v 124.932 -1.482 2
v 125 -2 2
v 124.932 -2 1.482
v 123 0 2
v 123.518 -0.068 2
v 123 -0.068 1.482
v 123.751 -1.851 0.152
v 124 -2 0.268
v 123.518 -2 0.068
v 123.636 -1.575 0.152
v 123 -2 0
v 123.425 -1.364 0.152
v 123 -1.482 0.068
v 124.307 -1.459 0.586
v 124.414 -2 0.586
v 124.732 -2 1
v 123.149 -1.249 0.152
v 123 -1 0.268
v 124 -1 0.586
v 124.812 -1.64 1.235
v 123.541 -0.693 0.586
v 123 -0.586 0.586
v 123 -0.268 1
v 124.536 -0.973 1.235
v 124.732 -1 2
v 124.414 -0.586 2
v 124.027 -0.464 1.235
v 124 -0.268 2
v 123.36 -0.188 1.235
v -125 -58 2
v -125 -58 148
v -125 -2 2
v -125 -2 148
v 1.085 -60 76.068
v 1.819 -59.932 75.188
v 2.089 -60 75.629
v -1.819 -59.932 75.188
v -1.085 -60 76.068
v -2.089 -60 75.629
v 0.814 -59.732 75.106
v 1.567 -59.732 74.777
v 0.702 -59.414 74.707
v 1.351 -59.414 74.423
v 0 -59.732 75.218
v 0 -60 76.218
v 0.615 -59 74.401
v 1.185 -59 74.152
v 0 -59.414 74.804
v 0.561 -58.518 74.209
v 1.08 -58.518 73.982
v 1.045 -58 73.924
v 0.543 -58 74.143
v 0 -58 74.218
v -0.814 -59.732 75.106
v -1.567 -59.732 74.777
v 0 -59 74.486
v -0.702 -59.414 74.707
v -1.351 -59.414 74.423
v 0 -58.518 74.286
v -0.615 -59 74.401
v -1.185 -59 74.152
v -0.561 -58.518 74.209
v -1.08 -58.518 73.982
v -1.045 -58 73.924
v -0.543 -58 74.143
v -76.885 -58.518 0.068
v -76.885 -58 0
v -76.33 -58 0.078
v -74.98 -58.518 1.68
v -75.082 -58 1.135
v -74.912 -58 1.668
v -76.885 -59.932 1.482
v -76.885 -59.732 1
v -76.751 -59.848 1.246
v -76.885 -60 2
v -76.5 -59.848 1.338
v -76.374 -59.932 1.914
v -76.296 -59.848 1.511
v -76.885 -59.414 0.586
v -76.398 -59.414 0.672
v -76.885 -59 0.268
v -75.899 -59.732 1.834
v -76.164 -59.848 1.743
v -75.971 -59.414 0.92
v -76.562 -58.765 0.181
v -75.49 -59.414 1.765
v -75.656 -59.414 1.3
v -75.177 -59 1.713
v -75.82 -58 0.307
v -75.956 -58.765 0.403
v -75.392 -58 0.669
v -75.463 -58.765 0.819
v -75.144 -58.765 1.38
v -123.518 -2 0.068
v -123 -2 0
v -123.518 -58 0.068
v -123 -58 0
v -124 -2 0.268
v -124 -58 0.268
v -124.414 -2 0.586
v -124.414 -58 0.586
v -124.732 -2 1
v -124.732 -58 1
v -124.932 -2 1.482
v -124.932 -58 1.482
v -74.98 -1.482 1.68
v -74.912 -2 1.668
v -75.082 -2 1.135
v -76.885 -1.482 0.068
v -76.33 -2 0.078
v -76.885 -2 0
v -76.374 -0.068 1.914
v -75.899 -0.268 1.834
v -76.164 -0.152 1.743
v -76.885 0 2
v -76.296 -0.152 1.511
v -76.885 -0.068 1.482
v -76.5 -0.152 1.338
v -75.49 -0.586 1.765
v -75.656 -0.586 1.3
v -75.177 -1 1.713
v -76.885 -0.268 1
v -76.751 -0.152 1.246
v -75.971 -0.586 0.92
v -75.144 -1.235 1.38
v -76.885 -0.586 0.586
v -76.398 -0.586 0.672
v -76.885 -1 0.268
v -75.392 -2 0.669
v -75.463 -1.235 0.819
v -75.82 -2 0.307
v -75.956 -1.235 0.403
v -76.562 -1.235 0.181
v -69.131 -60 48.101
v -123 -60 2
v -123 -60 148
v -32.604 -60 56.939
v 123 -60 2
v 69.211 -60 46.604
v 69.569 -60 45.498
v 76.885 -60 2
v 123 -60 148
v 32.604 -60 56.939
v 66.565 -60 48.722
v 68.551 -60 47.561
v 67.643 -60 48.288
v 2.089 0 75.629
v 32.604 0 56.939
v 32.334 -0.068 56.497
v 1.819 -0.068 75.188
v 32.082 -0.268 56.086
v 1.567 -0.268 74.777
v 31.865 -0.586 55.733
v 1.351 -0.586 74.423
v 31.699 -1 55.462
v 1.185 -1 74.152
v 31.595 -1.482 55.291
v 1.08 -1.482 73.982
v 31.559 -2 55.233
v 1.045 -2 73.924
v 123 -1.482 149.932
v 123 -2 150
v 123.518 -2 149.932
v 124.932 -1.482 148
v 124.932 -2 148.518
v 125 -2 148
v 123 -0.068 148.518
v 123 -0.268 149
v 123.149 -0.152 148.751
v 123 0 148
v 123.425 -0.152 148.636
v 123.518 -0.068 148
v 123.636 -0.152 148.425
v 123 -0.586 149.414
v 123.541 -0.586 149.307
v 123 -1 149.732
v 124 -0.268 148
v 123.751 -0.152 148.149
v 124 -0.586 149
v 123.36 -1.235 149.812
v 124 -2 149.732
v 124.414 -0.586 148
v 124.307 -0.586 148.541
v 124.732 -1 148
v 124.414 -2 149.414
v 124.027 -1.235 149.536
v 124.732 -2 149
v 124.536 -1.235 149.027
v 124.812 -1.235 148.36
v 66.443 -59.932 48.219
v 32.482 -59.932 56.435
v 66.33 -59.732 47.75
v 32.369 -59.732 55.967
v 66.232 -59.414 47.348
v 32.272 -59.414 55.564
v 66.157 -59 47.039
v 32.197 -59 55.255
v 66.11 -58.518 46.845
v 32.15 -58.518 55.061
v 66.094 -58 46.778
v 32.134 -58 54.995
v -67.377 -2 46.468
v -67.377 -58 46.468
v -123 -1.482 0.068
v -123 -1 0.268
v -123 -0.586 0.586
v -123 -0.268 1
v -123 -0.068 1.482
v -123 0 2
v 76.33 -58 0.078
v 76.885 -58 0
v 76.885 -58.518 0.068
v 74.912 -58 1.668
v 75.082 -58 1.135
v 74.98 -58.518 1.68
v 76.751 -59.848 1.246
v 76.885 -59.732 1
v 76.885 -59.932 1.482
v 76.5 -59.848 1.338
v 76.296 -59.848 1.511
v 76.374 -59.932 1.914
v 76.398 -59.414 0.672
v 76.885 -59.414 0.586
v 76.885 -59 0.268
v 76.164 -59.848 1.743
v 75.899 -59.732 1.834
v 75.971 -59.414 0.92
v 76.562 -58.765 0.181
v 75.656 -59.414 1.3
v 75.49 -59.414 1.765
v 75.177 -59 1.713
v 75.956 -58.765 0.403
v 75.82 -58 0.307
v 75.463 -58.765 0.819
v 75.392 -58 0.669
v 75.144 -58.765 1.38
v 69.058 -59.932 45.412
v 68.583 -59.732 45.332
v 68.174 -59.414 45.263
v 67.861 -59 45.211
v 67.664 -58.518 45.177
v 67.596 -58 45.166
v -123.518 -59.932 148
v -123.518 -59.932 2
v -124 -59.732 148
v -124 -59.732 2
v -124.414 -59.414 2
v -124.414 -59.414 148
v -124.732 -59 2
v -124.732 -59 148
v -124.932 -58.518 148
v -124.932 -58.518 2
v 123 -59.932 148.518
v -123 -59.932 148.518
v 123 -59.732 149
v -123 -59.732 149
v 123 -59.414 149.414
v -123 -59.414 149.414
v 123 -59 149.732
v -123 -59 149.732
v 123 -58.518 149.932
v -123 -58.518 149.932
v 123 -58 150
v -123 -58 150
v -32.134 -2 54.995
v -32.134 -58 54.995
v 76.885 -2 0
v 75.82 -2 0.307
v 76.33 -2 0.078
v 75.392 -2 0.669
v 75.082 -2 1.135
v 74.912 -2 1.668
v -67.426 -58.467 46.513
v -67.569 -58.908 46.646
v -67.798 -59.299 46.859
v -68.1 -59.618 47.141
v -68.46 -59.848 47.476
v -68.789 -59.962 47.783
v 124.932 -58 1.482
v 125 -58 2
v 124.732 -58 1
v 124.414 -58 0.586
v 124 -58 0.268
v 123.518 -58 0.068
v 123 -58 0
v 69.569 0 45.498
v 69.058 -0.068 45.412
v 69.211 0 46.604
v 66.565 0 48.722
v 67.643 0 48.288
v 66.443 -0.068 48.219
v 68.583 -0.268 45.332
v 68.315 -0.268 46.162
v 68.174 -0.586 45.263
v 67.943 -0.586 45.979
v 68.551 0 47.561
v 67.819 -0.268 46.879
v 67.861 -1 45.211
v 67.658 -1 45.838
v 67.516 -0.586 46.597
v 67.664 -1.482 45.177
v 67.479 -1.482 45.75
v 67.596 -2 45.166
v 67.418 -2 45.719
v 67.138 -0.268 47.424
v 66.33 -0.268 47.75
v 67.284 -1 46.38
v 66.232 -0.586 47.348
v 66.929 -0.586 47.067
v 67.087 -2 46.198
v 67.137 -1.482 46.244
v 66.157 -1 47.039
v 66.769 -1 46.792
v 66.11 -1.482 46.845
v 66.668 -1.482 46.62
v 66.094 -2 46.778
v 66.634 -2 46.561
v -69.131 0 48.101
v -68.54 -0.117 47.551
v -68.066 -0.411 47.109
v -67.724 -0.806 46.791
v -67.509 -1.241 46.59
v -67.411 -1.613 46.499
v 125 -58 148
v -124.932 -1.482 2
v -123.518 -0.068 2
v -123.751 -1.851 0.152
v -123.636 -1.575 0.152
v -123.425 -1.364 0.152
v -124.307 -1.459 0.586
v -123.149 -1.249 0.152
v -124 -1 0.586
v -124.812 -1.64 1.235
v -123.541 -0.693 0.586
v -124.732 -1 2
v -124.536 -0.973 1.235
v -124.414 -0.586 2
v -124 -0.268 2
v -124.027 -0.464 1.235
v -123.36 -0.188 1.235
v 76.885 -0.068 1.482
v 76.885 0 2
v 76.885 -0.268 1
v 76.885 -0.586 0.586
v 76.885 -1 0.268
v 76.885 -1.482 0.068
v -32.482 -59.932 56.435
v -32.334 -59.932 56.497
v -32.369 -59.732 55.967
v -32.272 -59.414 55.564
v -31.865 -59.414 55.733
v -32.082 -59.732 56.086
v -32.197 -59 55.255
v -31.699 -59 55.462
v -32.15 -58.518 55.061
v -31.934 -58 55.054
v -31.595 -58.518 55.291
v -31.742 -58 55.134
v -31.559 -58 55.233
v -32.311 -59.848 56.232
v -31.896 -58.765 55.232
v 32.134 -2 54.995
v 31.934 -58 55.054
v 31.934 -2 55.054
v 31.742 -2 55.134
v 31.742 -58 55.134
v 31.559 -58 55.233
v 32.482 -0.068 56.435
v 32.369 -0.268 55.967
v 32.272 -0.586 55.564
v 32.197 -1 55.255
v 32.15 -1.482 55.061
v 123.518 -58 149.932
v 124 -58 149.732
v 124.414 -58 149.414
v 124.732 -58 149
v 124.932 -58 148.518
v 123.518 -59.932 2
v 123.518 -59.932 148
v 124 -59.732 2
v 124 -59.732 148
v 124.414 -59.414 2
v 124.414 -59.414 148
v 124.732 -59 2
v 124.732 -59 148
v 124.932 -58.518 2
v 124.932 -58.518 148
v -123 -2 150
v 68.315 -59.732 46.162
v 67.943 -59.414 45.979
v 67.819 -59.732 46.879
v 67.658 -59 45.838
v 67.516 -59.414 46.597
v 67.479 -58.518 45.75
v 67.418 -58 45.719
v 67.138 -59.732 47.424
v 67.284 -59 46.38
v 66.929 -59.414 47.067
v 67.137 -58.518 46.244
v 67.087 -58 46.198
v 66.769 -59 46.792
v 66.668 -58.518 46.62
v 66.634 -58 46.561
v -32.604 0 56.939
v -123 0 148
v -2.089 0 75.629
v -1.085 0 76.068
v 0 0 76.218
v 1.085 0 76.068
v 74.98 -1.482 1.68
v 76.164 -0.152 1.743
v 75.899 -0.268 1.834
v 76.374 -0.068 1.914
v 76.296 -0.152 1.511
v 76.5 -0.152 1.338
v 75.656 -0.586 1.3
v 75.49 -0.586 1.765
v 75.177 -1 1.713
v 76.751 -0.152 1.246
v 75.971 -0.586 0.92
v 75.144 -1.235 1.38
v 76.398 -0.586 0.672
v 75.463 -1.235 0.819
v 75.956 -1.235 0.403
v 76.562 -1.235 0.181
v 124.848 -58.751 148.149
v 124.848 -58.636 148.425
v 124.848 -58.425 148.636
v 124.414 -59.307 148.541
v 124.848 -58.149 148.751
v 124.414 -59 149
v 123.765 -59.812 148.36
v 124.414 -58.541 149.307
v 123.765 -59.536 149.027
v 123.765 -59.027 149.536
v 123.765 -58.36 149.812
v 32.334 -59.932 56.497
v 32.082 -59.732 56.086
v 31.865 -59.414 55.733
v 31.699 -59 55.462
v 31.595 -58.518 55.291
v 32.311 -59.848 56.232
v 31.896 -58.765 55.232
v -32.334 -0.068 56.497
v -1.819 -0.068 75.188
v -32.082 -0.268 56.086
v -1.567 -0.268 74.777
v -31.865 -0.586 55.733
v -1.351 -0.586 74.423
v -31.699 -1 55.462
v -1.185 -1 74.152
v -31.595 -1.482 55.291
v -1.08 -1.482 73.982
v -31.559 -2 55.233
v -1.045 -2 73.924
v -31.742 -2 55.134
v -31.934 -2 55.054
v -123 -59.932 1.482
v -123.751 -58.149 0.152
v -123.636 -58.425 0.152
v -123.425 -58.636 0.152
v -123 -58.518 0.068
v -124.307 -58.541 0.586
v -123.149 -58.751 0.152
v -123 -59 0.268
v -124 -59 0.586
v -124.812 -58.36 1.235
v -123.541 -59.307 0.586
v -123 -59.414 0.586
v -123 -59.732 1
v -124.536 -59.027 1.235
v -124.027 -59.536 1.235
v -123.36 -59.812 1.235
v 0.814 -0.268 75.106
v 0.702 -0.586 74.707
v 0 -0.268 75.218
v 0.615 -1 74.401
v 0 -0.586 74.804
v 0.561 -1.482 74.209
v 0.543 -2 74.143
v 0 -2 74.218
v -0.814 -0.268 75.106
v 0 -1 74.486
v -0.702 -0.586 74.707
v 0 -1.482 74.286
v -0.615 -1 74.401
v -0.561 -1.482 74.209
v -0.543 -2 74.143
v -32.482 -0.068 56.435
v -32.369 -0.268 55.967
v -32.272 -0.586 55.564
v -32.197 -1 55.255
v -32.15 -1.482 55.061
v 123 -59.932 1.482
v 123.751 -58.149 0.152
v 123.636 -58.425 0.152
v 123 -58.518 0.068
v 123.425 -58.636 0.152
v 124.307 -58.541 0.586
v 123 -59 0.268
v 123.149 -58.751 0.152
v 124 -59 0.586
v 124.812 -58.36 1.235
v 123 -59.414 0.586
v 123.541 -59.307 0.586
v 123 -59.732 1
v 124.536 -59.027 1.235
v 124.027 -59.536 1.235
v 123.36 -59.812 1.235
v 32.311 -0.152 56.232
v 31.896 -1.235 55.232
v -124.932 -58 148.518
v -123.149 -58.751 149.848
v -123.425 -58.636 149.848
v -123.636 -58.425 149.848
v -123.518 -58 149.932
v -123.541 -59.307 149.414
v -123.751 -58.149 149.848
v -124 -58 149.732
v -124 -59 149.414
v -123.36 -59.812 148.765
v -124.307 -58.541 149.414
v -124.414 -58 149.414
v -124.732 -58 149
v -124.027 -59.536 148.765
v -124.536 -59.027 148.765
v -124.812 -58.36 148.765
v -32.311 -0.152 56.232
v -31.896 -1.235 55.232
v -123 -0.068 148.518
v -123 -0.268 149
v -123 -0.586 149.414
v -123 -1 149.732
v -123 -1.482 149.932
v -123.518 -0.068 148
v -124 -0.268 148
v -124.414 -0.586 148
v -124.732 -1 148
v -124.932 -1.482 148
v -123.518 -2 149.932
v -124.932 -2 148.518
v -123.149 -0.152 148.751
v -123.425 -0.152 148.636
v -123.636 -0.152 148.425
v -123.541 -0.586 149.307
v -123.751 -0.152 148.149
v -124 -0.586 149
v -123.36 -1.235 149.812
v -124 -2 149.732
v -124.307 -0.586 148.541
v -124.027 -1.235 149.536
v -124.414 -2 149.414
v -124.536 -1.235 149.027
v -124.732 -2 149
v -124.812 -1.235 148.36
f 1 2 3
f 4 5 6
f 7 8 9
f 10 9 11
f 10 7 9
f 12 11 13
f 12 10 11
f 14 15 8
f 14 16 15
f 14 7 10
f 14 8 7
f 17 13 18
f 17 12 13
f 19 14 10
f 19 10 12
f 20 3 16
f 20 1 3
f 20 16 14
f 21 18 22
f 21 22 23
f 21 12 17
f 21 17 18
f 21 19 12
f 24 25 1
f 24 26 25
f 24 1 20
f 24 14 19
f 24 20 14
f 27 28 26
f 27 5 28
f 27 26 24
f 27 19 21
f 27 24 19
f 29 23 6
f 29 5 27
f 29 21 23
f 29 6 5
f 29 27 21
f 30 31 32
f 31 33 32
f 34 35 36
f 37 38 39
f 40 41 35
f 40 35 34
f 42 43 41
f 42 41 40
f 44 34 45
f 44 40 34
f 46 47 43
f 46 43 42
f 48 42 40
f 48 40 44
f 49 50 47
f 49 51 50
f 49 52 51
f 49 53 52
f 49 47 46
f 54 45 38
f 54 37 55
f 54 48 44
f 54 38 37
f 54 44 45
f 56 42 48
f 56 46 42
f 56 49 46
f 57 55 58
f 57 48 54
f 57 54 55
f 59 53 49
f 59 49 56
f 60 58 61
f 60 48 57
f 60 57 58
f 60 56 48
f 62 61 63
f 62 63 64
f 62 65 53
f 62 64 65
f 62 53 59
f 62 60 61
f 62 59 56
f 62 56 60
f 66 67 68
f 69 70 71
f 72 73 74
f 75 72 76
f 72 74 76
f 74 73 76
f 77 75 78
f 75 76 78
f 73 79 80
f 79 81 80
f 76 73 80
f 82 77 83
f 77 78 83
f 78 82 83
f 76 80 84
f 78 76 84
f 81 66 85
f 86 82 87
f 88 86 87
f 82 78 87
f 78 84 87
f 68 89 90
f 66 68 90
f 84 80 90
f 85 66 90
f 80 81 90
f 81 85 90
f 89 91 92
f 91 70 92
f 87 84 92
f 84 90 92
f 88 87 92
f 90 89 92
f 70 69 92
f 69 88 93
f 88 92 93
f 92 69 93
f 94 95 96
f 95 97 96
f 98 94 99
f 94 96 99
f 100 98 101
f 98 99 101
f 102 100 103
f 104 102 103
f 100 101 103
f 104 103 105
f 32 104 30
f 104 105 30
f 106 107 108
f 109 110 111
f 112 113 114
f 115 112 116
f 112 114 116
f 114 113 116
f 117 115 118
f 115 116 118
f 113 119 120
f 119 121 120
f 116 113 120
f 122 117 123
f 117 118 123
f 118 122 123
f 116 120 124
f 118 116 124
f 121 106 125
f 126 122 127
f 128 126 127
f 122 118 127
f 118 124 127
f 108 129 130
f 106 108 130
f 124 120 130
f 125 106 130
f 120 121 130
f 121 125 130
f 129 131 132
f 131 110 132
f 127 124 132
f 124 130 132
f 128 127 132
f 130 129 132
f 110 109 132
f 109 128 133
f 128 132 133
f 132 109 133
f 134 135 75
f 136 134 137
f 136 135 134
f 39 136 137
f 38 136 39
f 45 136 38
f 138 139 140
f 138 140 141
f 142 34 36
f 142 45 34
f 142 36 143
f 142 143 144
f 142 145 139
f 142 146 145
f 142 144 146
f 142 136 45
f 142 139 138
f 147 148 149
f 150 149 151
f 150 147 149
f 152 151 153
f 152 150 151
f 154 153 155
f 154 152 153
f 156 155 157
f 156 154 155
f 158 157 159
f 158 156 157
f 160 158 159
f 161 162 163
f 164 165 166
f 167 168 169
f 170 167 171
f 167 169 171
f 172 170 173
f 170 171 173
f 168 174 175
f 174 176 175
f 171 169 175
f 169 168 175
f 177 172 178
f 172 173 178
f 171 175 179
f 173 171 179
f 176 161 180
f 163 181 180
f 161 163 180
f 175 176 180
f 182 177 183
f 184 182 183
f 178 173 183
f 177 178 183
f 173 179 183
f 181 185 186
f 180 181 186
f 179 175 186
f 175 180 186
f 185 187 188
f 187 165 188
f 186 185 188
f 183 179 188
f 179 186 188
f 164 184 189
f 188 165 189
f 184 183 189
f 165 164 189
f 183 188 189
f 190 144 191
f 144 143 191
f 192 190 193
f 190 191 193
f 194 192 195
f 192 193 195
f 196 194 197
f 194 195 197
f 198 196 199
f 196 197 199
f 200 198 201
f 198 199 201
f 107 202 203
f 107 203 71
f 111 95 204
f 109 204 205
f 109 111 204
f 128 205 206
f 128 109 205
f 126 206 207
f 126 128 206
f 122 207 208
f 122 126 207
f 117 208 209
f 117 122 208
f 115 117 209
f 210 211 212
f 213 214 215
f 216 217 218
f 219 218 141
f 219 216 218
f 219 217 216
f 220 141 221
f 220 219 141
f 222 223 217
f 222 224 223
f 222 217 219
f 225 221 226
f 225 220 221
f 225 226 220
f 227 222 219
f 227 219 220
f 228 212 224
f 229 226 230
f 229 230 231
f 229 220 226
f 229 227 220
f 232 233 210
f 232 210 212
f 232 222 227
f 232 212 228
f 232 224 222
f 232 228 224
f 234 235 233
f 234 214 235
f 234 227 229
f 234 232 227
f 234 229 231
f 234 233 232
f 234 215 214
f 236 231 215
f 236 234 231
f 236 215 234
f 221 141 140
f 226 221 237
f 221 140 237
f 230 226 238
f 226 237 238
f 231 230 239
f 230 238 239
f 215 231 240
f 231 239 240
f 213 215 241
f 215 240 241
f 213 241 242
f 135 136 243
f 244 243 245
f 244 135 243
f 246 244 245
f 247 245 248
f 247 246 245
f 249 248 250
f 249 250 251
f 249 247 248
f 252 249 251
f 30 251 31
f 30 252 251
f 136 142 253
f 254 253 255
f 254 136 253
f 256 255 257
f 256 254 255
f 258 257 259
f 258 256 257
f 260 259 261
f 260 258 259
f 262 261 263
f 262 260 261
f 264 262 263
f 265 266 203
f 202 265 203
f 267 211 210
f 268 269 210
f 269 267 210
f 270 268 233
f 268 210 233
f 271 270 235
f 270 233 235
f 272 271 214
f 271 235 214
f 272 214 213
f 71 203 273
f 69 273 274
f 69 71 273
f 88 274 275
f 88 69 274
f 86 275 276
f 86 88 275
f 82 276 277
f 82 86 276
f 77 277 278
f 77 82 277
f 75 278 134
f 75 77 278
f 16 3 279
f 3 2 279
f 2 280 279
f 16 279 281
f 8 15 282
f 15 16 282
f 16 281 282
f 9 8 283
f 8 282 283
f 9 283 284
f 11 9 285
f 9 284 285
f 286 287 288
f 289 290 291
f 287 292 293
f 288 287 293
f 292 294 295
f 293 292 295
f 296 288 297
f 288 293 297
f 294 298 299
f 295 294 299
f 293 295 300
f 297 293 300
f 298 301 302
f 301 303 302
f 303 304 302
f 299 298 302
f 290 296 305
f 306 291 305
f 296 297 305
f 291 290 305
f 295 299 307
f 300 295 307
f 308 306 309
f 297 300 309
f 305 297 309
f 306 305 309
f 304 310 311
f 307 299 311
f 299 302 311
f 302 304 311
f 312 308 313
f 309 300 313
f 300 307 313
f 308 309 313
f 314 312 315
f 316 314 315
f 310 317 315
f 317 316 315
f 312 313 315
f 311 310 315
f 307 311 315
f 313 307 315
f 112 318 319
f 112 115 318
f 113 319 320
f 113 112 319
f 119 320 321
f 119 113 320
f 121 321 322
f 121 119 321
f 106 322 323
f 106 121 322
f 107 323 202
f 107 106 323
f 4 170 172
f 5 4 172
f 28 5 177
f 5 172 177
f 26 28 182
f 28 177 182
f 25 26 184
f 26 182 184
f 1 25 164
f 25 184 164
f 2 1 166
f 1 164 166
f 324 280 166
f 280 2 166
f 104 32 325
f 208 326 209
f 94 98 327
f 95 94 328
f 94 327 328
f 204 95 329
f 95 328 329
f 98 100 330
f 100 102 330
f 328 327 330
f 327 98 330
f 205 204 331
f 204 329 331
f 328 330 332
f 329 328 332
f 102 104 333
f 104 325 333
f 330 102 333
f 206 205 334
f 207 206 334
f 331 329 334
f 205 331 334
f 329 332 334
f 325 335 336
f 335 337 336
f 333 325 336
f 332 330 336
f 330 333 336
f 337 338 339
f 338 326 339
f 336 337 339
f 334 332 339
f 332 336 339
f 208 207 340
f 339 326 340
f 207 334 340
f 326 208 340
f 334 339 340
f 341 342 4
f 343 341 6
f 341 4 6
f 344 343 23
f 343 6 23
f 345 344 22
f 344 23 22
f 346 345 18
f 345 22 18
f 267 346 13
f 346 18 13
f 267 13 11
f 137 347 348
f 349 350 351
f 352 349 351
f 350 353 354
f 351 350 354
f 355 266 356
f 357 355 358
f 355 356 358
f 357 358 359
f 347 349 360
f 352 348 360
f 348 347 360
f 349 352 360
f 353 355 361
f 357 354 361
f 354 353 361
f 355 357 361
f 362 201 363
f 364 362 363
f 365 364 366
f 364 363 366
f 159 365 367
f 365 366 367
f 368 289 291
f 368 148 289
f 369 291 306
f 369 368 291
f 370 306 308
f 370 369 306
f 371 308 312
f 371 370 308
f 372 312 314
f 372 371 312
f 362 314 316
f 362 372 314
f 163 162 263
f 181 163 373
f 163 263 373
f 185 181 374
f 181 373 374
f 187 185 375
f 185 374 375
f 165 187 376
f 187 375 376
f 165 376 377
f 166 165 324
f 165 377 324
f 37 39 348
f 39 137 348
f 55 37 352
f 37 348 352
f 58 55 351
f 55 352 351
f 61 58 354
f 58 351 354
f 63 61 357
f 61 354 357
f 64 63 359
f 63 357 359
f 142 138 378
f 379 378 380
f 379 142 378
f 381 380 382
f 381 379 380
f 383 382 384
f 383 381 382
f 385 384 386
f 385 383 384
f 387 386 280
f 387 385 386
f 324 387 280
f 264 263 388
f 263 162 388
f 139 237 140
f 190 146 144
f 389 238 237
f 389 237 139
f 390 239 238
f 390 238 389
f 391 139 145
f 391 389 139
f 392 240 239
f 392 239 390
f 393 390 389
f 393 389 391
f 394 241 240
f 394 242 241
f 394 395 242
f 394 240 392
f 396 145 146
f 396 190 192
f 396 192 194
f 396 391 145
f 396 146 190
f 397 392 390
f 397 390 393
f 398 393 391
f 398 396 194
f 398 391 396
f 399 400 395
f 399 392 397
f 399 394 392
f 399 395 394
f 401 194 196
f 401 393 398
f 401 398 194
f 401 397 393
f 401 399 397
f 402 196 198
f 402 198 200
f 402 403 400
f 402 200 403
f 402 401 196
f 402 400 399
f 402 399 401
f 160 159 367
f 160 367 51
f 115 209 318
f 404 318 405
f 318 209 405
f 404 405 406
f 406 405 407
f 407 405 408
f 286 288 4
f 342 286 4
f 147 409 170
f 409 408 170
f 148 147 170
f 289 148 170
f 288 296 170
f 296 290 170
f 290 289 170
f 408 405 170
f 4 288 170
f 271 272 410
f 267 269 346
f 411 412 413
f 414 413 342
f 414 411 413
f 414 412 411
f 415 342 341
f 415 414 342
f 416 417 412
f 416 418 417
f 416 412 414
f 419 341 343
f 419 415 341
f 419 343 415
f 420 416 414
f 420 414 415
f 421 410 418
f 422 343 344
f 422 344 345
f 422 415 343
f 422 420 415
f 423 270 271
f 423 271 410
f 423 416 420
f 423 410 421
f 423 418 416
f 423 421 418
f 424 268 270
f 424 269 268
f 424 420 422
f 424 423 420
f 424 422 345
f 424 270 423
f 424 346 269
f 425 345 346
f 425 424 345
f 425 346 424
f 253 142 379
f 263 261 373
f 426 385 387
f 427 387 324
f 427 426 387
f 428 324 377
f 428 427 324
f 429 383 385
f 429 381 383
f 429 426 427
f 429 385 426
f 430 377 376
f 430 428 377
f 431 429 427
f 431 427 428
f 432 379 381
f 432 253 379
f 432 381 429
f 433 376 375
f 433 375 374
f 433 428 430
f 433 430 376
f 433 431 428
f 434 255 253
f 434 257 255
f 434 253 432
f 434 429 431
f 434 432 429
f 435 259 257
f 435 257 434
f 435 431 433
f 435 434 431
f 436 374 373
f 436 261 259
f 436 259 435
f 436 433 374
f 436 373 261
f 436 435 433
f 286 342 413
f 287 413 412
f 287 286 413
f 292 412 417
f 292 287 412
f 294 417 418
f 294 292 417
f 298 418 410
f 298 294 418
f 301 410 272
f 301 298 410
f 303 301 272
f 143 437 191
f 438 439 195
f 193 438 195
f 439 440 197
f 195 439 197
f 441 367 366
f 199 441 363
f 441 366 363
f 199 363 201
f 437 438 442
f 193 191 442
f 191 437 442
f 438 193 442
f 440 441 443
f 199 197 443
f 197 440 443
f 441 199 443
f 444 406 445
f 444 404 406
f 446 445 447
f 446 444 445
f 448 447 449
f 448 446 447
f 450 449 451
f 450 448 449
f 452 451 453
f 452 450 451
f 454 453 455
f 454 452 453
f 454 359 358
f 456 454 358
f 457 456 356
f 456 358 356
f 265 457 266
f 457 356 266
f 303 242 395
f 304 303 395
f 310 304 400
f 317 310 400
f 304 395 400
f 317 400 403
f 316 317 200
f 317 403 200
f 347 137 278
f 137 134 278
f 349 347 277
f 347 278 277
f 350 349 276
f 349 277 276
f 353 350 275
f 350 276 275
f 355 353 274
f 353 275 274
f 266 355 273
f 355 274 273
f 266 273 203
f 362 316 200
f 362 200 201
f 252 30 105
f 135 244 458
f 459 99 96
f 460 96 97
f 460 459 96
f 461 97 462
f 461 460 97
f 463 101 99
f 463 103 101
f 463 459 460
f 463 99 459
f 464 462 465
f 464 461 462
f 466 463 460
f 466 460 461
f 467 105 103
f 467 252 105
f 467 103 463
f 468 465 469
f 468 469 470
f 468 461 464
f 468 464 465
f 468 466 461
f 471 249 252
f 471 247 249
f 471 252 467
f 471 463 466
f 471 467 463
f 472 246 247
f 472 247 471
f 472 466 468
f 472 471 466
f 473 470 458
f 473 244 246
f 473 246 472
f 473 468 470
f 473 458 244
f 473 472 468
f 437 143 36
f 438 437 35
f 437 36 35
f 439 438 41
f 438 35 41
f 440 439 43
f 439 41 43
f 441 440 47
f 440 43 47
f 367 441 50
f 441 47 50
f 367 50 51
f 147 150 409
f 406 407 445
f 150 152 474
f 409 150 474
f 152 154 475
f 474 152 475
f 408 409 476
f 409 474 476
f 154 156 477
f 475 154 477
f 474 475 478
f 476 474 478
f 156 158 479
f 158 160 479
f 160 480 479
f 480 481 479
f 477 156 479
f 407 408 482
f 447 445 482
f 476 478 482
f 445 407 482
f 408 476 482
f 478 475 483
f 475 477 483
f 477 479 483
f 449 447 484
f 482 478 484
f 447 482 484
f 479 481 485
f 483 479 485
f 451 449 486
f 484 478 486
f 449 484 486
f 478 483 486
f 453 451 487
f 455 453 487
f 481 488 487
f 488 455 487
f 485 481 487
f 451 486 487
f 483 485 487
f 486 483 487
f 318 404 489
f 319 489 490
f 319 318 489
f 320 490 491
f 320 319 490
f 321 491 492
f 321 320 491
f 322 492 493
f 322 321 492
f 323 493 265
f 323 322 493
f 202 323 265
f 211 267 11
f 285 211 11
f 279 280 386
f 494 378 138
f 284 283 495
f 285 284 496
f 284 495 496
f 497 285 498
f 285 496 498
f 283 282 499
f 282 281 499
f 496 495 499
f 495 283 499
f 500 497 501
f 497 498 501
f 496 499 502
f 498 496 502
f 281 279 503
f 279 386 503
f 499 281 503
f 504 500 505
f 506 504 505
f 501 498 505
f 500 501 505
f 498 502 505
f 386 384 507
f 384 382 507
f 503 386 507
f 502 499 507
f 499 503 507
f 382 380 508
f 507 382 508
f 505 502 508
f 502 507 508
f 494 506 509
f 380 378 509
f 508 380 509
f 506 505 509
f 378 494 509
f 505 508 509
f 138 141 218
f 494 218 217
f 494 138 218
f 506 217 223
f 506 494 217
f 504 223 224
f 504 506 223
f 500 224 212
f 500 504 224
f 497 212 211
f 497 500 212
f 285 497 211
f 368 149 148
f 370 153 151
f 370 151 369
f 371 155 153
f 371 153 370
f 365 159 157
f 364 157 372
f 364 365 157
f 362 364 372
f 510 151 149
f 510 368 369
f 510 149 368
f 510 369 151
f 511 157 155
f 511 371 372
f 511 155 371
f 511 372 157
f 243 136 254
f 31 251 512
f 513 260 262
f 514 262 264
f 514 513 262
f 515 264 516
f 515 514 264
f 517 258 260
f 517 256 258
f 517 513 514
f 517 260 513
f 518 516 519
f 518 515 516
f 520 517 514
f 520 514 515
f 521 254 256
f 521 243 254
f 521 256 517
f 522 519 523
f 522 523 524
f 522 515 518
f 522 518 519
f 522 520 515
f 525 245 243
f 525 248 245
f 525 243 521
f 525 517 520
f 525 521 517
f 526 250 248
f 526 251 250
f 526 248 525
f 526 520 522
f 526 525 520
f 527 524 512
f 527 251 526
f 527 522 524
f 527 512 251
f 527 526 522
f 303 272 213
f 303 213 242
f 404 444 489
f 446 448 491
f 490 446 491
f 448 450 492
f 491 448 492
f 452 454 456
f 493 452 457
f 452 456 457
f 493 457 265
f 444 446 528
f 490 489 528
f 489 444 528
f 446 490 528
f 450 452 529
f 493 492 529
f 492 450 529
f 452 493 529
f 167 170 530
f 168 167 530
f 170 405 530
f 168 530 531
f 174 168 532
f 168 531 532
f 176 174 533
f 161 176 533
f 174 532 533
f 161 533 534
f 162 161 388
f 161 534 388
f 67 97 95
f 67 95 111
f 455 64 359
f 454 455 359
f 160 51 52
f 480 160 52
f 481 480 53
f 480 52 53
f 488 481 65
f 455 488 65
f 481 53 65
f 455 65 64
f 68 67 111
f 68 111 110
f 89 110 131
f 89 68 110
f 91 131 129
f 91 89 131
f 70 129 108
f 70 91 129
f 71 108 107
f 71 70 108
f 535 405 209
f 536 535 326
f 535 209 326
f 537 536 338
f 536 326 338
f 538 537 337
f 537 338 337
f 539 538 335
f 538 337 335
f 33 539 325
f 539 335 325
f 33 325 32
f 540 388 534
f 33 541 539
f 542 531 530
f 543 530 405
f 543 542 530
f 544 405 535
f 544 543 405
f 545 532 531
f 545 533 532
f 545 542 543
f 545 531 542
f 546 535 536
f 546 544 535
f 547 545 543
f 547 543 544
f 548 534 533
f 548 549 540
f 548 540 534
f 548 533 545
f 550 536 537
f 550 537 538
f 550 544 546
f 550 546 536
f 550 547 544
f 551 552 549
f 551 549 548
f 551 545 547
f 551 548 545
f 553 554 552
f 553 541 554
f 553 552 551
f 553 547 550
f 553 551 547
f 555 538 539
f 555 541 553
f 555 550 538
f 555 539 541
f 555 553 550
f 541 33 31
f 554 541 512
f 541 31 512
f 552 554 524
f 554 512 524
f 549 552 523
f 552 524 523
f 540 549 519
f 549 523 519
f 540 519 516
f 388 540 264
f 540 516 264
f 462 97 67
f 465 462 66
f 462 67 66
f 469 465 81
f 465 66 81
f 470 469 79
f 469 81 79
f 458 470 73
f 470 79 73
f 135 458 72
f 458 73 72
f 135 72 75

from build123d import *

# Parameters (mm, degrees)
F1_DEPTH = 60
F3_DEPTH = 60
F4_R     = 2


with BuildPart() as f1:
    # F0 (on Front) → F1 (new body)
    with BuildSketch(Plane.XZ):
        Polygon((-125, 0), (0, 0), (125, 0), (125, 150), (-125, 150), align=None)
    extrude(amount=F1_DEPTH)

    # F2 (on Front) → F3 (cut)
    with BuildSketch(Plane.XZ):
        Polygon((-67.3774927855, 46.4679524302), (-75.1930549741, 0), (75.1930549741, 0), (67.3774927855, 46.4679524302), (31.8278856575, 55.0686642528), (0, 74.5636075735), (-31.8278856575, 55.0686642528), align=None)
    extrude(amount=F3_DEPTH, mode=Mode.SUBTRACT)

    # F4
    f4_edges = [f1.edges().sort_by_distance(p)[0] for p in [
        (-125, -60, 75),
        (0, -60, 150),
        (125, -60, 75),
        (-125, -30, 150),
        (125, -30, 150),
        (0, 0, 150),
        (-125, 0, 75),
        (-125, -30, 0),
        (125, 0, 75),
        (125, -30, 0),
        (100.096527, 0, 0),
        (75.193055, -30, 0),
        (100.096527, -60, 0),
        (-100.096527, -60, 0),
        (-71.285274, -60, 23.233976),
        (-49.602689, -60, 50.768308),
        (-15.913943, -60, 64.816136),
        (31.827886, -30, 55.068664),
        (-31.827886, -30, 55.068664),
        (0, -30, 74.563608),
        (15.913943, -60, 64.816136),
        (49.602689, -60, 50.768308),
        (67.377493, -30, 46.467952),
        (71.285274, -60, 23.233976),
        (-100.096527, 0, 0),
        (-75.193055, -30, 0),
        (71.285274, 0, 23.233976),
        (15.913943, 0, 64.816136),
        (49.602689, 0, 50.768308),
        (-15.913943, 0, 64.816136),
        (-49.602689, 0, 50.768308),
        (-71.285274, 0, 23.233976),
    ]]
    fillet(f4_edges, radius=F4_R)


solid = f1.part
